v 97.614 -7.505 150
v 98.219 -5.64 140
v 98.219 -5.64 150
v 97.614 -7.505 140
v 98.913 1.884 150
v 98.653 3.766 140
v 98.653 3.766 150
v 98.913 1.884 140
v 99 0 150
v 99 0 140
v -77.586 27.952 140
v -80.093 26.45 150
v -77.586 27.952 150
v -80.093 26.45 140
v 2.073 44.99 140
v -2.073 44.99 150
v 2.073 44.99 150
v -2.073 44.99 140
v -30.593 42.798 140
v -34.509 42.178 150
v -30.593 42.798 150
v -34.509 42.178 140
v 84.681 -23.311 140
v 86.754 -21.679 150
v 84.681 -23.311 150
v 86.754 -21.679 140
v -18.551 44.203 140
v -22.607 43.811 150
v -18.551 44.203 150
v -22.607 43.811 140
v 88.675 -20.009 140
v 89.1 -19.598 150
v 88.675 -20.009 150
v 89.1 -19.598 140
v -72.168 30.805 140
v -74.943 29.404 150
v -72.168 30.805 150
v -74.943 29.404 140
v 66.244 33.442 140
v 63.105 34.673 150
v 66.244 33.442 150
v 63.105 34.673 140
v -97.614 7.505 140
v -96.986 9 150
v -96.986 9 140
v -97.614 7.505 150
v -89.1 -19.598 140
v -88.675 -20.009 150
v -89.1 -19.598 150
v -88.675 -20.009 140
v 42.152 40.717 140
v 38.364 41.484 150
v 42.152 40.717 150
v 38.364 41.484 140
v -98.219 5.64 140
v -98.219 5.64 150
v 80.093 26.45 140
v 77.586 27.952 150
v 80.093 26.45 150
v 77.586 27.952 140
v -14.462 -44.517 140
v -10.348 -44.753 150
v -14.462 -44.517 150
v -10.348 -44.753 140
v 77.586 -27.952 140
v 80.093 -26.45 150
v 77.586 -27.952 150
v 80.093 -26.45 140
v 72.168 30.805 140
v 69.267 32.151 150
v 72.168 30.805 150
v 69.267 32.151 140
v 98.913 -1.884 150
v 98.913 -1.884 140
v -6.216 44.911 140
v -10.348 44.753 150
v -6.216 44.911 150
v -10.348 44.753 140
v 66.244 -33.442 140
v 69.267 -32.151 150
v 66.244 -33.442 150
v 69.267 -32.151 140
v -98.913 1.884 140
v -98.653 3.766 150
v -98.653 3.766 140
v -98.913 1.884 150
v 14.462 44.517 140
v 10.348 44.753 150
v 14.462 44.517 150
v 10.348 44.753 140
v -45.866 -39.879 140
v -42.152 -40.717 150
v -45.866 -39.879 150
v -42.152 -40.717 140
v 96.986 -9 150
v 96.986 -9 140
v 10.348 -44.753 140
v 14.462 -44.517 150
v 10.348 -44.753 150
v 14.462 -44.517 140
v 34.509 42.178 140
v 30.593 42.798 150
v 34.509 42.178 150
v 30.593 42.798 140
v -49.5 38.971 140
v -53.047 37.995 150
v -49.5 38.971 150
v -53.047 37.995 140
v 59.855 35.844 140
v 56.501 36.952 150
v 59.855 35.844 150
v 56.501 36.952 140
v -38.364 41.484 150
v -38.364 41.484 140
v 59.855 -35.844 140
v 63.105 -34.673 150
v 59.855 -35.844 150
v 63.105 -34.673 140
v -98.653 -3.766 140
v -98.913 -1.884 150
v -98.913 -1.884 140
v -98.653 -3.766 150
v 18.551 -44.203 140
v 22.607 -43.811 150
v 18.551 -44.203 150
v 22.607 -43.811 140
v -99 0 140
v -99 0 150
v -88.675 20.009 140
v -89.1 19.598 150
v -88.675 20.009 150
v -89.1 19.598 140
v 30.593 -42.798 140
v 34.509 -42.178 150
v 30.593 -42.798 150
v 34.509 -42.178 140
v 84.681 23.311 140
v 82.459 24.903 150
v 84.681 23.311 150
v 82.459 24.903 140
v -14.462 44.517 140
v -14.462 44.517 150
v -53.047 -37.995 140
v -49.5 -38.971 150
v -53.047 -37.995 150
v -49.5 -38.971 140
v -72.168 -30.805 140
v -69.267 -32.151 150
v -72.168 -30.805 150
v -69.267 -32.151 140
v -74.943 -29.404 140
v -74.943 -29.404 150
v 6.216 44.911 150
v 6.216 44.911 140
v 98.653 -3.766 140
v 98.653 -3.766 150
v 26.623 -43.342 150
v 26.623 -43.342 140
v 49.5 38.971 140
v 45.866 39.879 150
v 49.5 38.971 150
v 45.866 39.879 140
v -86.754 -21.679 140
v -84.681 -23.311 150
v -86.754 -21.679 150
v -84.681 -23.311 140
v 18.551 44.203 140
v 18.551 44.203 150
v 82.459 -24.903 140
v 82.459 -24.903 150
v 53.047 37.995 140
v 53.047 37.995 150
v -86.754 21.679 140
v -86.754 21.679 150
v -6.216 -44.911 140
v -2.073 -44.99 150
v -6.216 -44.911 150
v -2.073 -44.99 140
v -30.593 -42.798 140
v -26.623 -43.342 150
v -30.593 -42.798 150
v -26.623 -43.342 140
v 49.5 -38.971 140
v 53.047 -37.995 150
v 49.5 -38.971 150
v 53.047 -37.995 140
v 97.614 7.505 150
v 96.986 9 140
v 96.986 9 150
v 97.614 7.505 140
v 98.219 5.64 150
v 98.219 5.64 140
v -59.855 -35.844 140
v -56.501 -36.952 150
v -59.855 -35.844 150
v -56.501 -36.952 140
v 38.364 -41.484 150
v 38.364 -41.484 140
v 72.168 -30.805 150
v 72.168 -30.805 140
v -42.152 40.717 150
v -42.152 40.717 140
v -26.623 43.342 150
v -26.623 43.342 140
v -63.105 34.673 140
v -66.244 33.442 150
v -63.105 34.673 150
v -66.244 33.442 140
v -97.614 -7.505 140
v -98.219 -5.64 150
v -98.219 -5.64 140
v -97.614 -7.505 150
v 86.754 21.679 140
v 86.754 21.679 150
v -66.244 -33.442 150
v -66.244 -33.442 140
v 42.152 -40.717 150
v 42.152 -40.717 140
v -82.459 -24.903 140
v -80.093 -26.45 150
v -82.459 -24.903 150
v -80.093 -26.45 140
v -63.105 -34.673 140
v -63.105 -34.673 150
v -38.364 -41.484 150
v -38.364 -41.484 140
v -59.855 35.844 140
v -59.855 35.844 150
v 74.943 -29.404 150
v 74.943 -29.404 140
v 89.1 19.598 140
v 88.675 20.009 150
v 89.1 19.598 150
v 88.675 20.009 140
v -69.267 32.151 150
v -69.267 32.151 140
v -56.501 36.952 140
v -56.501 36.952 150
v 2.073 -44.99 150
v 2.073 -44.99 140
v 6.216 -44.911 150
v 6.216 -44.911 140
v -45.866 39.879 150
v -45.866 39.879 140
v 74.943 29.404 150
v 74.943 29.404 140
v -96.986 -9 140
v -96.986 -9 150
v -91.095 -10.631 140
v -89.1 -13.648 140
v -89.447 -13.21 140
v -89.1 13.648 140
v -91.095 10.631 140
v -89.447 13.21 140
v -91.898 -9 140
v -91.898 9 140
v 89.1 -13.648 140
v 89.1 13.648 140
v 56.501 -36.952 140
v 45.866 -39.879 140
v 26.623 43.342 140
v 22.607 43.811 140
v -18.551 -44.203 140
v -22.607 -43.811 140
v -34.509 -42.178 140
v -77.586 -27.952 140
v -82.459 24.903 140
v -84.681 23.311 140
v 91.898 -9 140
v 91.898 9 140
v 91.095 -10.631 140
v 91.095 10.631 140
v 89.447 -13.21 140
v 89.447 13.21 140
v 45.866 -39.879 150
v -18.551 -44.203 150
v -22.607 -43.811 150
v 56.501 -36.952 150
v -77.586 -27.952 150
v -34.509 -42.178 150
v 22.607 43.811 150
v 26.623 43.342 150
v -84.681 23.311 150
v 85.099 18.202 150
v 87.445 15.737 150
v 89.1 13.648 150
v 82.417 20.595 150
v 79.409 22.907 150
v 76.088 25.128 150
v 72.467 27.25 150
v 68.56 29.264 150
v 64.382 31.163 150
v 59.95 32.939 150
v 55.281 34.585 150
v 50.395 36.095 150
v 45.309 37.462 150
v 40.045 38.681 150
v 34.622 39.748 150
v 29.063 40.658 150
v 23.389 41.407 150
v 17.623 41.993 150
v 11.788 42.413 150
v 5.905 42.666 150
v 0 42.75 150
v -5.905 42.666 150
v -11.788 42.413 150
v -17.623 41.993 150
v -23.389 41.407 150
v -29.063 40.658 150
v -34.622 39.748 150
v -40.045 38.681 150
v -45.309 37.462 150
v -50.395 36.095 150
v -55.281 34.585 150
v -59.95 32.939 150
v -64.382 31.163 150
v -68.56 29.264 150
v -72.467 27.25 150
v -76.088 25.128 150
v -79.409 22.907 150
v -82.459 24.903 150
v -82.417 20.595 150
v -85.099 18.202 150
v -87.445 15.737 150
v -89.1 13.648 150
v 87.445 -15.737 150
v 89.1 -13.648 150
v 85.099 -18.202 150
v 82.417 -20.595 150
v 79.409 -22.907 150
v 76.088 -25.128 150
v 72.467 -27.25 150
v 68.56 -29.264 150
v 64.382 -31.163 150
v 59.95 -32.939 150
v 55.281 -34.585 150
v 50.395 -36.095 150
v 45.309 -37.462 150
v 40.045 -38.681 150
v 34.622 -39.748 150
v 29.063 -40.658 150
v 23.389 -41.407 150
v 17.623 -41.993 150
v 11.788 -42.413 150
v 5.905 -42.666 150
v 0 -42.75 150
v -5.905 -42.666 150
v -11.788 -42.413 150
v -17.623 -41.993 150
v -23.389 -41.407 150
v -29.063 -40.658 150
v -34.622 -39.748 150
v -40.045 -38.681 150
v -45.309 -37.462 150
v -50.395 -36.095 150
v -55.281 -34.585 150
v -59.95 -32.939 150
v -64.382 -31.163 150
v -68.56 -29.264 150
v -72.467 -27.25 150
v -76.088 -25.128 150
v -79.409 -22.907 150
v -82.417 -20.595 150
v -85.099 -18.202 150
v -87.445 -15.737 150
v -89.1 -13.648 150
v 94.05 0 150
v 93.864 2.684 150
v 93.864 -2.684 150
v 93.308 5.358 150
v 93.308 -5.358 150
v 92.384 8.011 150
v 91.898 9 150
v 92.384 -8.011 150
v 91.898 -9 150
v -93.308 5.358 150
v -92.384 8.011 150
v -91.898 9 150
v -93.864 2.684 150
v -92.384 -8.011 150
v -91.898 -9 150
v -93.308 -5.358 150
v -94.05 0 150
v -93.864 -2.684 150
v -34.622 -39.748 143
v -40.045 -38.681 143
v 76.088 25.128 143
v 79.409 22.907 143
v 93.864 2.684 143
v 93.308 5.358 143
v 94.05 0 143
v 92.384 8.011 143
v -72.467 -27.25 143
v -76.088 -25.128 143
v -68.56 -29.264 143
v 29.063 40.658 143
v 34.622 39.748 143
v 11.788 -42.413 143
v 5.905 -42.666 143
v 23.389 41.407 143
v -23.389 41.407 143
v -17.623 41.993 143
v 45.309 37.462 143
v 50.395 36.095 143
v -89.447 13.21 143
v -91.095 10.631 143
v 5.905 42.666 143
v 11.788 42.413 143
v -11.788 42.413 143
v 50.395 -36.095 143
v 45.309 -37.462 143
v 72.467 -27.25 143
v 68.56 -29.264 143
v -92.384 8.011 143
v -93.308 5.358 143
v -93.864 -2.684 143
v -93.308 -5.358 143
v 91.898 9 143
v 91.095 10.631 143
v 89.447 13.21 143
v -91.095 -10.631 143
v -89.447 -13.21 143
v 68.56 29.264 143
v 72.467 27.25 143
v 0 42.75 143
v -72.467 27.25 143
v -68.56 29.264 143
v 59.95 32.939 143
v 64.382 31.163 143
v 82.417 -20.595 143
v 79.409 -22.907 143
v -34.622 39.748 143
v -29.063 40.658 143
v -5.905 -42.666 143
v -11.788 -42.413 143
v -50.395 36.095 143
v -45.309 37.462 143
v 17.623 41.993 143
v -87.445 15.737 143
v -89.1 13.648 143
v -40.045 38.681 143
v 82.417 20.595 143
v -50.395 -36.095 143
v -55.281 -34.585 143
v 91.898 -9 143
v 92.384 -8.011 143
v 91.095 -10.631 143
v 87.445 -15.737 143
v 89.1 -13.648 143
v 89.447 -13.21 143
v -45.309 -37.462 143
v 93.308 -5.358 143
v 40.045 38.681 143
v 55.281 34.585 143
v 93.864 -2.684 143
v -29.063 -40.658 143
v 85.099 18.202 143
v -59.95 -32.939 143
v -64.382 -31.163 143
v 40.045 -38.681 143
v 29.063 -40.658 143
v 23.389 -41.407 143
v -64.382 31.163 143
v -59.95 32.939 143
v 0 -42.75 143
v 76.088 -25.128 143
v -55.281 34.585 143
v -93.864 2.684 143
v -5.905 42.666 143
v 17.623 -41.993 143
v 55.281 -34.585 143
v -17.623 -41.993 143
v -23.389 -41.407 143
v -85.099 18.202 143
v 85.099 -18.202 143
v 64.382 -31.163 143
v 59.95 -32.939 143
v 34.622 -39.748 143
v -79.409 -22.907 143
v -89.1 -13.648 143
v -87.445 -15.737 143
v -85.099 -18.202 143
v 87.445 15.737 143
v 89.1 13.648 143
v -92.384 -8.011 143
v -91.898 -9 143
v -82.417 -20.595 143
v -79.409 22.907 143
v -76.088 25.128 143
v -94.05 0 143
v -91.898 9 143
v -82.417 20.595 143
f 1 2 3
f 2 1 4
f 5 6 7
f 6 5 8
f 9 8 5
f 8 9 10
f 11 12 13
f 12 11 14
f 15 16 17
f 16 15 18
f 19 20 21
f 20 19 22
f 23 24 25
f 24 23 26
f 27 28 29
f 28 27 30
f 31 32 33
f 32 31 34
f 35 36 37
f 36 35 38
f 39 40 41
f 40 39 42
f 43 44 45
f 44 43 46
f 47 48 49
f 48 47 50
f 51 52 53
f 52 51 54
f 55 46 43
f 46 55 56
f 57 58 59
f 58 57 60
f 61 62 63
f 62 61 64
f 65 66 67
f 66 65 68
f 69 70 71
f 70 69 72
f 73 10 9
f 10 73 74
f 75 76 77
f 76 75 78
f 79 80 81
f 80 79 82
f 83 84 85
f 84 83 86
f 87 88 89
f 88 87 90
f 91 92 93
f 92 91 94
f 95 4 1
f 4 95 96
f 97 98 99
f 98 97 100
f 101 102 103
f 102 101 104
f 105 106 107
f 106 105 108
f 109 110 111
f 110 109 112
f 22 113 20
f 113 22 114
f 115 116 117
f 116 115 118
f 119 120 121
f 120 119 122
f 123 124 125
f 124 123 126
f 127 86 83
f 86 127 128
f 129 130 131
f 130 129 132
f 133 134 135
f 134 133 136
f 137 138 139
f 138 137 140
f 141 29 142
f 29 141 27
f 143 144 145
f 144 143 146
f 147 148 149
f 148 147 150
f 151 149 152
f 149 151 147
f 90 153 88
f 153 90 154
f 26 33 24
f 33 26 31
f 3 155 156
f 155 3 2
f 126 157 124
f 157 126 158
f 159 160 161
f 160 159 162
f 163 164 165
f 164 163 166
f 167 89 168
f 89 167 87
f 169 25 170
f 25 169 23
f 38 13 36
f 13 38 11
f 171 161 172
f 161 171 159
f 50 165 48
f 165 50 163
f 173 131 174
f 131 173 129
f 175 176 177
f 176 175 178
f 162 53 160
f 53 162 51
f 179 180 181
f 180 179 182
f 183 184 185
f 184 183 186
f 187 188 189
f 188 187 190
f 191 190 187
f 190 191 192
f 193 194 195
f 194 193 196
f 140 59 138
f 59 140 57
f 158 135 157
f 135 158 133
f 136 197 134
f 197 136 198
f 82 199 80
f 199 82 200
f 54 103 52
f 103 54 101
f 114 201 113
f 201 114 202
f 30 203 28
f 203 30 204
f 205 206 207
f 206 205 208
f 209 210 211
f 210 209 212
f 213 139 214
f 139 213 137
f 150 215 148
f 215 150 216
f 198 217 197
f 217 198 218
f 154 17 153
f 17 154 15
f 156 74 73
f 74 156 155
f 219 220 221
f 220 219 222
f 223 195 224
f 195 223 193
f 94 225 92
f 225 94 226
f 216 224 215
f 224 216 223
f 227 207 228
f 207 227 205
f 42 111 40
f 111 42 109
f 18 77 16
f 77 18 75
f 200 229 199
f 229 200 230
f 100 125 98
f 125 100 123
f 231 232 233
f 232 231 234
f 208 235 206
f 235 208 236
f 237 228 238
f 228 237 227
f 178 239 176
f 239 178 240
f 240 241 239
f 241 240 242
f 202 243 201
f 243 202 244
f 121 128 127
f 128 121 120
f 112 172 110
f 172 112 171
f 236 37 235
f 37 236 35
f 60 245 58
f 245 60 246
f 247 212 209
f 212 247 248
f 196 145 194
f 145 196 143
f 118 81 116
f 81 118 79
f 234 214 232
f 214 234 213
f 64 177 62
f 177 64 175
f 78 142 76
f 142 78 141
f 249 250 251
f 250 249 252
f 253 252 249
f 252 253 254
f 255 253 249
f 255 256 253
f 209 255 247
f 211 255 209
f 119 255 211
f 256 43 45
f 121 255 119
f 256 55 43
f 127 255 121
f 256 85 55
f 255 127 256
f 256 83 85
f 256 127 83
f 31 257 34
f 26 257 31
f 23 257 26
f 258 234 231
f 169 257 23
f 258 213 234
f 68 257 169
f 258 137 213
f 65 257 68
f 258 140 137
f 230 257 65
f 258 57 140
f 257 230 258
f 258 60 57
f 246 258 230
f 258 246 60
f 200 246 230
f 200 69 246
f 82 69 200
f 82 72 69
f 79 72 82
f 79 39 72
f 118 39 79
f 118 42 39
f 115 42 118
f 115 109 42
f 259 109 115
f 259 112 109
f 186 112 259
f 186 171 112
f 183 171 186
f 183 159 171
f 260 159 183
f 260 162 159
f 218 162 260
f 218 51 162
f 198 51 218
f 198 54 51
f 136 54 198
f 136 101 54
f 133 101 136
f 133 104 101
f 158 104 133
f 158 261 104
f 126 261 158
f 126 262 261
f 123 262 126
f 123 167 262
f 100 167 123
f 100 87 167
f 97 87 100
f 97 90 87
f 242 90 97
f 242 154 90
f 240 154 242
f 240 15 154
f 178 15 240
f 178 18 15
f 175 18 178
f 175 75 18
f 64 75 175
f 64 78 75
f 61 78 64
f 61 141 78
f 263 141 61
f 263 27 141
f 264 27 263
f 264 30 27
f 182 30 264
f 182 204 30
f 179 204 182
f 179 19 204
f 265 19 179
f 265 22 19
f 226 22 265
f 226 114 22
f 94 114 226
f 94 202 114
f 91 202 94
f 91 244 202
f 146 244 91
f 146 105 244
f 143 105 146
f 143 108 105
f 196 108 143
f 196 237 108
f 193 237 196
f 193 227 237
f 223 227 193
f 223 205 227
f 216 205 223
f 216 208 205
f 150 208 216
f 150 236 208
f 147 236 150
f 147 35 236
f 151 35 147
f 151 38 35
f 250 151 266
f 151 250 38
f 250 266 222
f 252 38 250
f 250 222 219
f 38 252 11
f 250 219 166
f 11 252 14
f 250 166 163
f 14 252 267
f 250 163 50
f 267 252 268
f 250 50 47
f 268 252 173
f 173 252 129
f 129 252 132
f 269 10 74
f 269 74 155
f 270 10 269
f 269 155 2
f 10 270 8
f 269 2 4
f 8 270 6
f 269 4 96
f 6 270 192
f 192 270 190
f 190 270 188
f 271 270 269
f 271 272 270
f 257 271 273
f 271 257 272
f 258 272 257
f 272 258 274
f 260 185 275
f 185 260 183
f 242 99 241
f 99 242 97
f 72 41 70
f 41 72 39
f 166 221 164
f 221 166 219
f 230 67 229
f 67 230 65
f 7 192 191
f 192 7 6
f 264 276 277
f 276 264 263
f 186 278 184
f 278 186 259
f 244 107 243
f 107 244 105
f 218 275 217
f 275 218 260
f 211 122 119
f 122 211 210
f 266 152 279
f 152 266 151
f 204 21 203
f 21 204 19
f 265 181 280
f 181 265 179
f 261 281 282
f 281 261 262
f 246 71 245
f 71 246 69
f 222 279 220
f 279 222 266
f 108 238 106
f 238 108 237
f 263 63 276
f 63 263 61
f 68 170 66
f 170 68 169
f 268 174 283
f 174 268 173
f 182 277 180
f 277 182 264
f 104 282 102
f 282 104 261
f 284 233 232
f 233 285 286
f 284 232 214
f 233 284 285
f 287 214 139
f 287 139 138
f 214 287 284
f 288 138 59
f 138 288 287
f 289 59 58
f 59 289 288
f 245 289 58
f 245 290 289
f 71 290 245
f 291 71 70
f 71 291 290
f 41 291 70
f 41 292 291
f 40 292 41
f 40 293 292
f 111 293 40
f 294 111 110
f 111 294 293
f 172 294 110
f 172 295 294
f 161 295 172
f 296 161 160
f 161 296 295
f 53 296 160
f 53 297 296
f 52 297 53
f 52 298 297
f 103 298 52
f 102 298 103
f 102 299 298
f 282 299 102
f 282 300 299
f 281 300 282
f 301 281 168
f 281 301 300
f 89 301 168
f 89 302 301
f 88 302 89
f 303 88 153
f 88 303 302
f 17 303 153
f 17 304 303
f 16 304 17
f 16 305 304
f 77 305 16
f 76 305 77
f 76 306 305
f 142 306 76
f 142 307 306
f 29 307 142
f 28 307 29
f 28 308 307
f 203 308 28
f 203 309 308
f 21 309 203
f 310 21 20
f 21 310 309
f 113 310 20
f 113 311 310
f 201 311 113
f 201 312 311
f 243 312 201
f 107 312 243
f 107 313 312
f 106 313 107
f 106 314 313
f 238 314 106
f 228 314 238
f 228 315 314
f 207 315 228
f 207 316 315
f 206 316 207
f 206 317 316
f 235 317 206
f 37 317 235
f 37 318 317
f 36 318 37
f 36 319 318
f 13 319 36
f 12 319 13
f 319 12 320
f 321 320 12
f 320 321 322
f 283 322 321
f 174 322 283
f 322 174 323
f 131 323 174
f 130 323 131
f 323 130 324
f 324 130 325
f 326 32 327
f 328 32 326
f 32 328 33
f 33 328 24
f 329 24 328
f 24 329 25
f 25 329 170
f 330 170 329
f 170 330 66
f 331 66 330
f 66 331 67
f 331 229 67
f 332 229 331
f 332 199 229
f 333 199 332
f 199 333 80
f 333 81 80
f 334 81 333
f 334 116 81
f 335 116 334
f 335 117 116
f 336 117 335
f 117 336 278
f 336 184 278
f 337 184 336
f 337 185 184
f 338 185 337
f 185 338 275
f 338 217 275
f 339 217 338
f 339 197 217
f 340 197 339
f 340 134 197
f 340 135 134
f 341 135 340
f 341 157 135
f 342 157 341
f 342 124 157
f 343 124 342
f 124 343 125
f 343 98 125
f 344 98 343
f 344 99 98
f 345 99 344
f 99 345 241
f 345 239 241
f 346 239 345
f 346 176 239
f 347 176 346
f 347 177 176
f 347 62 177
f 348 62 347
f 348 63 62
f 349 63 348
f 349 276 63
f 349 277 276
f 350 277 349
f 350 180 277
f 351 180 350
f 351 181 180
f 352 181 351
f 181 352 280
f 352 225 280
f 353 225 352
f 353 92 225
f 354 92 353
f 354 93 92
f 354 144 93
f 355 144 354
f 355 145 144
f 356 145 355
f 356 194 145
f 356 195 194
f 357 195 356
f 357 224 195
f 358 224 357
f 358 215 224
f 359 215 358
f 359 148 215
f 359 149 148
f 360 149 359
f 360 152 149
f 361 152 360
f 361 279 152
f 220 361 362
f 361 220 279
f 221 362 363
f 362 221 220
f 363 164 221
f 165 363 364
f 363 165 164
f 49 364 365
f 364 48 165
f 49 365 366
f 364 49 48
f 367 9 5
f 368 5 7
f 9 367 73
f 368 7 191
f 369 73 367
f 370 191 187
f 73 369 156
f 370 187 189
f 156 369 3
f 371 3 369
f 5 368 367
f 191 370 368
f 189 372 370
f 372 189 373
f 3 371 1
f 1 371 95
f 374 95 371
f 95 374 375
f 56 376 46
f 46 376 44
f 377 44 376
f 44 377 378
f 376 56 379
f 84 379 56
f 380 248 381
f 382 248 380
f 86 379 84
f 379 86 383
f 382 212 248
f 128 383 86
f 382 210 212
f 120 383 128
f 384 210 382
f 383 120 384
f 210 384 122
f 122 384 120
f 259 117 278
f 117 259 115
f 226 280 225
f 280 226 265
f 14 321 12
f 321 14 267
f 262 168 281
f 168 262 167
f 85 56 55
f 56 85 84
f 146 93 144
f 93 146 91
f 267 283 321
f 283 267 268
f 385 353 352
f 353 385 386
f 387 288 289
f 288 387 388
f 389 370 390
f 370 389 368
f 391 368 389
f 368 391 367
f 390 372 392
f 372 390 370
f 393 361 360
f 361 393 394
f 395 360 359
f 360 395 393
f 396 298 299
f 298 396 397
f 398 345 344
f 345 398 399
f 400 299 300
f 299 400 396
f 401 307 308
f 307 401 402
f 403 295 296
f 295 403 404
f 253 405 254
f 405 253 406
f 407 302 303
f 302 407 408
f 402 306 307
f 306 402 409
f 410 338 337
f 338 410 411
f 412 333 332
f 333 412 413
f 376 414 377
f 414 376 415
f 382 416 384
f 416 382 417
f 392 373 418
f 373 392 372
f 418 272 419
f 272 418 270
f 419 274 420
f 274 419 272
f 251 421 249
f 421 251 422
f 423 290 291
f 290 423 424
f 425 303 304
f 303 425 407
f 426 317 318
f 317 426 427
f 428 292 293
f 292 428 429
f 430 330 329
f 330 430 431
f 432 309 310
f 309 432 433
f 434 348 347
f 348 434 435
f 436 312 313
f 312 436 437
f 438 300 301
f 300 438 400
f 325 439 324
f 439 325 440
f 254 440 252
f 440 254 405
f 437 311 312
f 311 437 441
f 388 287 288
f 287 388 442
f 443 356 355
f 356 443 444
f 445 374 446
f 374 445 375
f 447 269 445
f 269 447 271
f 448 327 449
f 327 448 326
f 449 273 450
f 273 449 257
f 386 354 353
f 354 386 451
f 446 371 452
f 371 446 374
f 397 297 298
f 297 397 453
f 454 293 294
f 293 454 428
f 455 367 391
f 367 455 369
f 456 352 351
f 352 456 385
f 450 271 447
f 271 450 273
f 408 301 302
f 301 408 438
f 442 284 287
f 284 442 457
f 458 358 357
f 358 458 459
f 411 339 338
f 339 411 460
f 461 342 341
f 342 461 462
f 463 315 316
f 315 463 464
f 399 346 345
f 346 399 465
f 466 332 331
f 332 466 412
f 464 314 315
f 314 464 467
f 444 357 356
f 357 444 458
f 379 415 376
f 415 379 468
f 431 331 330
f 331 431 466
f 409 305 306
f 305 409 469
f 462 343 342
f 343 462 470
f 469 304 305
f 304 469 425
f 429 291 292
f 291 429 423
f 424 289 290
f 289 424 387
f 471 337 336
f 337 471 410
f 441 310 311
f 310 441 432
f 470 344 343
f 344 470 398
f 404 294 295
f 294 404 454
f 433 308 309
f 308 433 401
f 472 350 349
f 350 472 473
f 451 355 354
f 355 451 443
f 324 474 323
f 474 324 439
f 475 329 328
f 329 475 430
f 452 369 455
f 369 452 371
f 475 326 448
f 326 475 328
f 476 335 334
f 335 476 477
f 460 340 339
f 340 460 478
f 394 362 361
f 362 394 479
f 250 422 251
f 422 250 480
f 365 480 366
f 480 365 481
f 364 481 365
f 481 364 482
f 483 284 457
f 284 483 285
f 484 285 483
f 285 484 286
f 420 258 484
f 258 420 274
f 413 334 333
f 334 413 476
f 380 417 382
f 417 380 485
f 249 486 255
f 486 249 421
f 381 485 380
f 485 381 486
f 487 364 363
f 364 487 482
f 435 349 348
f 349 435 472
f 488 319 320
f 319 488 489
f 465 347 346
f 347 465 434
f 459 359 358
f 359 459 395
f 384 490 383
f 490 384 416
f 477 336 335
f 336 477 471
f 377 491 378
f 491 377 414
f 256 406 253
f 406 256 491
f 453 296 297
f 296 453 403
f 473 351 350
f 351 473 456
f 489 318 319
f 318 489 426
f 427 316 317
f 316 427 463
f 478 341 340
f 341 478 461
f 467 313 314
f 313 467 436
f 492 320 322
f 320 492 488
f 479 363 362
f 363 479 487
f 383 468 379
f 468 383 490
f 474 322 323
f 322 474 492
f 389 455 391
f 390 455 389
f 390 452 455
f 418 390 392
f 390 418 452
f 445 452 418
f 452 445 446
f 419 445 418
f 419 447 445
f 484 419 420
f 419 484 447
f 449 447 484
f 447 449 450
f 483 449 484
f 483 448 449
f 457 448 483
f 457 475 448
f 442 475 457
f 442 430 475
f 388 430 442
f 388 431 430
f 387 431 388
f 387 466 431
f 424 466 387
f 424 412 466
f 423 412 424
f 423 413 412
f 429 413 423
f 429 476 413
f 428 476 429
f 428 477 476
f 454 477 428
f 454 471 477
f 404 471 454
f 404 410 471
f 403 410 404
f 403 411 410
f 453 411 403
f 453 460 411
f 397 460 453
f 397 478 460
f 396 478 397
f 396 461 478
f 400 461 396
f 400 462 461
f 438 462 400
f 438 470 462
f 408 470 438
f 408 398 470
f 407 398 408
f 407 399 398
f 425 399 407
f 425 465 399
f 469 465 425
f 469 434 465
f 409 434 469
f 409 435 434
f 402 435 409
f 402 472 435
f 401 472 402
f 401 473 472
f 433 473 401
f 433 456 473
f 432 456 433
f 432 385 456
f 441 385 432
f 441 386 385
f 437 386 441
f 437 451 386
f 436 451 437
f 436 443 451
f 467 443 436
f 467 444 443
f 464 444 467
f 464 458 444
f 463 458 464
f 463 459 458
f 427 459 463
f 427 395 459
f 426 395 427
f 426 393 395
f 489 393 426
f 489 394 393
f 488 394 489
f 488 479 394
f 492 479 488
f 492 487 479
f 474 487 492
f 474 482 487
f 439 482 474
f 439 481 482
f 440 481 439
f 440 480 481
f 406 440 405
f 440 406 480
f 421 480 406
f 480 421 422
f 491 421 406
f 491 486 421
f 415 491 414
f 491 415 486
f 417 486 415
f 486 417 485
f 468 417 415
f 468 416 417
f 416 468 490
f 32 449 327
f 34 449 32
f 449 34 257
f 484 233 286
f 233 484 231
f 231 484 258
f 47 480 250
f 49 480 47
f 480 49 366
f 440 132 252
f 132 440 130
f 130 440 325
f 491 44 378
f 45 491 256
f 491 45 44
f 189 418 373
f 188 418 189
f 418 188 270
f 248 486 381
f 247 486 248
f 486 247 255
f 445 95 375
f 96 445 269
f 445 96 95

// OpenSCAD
WIDTH = 90;
HEIGHT = 150;
SCALE=2.2;

module plate() {
    difference() {
        scale([SCALE, 1, 1]) cylinder(10, WIDTH/2, WIDTH/2, $fn=150);
        translate([0, 0, 3]) scale([0.95, 0.95, 1]) scale([SCALE, 1, 1]) cylinder(10, WIDTH/2, WIDTH/2, $fn=100);
    }
}


plate();

module base(){
    difference() {
        scale([2.2, 1, 1]) cylinder(HEIGHT, WIDTH/2, WIDTH/2, $fn=150);
        translate([0, 0, 3]) scale([0.95, 0.95, 1]) scale([2.2, 1, 1]) cylinder(HEIGHT, WIDTH/2, WIDTH/2, $fn=100);
        translate([-WIDTH*SCALE*0.9/2, -WIDTH]) cube([WIDTH*SCALE*0.9, WIDTH*2, HEIGHT]);
        translate([-500, -WIDTH*0.1]) cube([1000, WIDTH*0.2, HEIGHT]);
        
    }
}

base();

!difference() {
    translate([0, 0, HEIGHT-10]) plate();
    base();
}
